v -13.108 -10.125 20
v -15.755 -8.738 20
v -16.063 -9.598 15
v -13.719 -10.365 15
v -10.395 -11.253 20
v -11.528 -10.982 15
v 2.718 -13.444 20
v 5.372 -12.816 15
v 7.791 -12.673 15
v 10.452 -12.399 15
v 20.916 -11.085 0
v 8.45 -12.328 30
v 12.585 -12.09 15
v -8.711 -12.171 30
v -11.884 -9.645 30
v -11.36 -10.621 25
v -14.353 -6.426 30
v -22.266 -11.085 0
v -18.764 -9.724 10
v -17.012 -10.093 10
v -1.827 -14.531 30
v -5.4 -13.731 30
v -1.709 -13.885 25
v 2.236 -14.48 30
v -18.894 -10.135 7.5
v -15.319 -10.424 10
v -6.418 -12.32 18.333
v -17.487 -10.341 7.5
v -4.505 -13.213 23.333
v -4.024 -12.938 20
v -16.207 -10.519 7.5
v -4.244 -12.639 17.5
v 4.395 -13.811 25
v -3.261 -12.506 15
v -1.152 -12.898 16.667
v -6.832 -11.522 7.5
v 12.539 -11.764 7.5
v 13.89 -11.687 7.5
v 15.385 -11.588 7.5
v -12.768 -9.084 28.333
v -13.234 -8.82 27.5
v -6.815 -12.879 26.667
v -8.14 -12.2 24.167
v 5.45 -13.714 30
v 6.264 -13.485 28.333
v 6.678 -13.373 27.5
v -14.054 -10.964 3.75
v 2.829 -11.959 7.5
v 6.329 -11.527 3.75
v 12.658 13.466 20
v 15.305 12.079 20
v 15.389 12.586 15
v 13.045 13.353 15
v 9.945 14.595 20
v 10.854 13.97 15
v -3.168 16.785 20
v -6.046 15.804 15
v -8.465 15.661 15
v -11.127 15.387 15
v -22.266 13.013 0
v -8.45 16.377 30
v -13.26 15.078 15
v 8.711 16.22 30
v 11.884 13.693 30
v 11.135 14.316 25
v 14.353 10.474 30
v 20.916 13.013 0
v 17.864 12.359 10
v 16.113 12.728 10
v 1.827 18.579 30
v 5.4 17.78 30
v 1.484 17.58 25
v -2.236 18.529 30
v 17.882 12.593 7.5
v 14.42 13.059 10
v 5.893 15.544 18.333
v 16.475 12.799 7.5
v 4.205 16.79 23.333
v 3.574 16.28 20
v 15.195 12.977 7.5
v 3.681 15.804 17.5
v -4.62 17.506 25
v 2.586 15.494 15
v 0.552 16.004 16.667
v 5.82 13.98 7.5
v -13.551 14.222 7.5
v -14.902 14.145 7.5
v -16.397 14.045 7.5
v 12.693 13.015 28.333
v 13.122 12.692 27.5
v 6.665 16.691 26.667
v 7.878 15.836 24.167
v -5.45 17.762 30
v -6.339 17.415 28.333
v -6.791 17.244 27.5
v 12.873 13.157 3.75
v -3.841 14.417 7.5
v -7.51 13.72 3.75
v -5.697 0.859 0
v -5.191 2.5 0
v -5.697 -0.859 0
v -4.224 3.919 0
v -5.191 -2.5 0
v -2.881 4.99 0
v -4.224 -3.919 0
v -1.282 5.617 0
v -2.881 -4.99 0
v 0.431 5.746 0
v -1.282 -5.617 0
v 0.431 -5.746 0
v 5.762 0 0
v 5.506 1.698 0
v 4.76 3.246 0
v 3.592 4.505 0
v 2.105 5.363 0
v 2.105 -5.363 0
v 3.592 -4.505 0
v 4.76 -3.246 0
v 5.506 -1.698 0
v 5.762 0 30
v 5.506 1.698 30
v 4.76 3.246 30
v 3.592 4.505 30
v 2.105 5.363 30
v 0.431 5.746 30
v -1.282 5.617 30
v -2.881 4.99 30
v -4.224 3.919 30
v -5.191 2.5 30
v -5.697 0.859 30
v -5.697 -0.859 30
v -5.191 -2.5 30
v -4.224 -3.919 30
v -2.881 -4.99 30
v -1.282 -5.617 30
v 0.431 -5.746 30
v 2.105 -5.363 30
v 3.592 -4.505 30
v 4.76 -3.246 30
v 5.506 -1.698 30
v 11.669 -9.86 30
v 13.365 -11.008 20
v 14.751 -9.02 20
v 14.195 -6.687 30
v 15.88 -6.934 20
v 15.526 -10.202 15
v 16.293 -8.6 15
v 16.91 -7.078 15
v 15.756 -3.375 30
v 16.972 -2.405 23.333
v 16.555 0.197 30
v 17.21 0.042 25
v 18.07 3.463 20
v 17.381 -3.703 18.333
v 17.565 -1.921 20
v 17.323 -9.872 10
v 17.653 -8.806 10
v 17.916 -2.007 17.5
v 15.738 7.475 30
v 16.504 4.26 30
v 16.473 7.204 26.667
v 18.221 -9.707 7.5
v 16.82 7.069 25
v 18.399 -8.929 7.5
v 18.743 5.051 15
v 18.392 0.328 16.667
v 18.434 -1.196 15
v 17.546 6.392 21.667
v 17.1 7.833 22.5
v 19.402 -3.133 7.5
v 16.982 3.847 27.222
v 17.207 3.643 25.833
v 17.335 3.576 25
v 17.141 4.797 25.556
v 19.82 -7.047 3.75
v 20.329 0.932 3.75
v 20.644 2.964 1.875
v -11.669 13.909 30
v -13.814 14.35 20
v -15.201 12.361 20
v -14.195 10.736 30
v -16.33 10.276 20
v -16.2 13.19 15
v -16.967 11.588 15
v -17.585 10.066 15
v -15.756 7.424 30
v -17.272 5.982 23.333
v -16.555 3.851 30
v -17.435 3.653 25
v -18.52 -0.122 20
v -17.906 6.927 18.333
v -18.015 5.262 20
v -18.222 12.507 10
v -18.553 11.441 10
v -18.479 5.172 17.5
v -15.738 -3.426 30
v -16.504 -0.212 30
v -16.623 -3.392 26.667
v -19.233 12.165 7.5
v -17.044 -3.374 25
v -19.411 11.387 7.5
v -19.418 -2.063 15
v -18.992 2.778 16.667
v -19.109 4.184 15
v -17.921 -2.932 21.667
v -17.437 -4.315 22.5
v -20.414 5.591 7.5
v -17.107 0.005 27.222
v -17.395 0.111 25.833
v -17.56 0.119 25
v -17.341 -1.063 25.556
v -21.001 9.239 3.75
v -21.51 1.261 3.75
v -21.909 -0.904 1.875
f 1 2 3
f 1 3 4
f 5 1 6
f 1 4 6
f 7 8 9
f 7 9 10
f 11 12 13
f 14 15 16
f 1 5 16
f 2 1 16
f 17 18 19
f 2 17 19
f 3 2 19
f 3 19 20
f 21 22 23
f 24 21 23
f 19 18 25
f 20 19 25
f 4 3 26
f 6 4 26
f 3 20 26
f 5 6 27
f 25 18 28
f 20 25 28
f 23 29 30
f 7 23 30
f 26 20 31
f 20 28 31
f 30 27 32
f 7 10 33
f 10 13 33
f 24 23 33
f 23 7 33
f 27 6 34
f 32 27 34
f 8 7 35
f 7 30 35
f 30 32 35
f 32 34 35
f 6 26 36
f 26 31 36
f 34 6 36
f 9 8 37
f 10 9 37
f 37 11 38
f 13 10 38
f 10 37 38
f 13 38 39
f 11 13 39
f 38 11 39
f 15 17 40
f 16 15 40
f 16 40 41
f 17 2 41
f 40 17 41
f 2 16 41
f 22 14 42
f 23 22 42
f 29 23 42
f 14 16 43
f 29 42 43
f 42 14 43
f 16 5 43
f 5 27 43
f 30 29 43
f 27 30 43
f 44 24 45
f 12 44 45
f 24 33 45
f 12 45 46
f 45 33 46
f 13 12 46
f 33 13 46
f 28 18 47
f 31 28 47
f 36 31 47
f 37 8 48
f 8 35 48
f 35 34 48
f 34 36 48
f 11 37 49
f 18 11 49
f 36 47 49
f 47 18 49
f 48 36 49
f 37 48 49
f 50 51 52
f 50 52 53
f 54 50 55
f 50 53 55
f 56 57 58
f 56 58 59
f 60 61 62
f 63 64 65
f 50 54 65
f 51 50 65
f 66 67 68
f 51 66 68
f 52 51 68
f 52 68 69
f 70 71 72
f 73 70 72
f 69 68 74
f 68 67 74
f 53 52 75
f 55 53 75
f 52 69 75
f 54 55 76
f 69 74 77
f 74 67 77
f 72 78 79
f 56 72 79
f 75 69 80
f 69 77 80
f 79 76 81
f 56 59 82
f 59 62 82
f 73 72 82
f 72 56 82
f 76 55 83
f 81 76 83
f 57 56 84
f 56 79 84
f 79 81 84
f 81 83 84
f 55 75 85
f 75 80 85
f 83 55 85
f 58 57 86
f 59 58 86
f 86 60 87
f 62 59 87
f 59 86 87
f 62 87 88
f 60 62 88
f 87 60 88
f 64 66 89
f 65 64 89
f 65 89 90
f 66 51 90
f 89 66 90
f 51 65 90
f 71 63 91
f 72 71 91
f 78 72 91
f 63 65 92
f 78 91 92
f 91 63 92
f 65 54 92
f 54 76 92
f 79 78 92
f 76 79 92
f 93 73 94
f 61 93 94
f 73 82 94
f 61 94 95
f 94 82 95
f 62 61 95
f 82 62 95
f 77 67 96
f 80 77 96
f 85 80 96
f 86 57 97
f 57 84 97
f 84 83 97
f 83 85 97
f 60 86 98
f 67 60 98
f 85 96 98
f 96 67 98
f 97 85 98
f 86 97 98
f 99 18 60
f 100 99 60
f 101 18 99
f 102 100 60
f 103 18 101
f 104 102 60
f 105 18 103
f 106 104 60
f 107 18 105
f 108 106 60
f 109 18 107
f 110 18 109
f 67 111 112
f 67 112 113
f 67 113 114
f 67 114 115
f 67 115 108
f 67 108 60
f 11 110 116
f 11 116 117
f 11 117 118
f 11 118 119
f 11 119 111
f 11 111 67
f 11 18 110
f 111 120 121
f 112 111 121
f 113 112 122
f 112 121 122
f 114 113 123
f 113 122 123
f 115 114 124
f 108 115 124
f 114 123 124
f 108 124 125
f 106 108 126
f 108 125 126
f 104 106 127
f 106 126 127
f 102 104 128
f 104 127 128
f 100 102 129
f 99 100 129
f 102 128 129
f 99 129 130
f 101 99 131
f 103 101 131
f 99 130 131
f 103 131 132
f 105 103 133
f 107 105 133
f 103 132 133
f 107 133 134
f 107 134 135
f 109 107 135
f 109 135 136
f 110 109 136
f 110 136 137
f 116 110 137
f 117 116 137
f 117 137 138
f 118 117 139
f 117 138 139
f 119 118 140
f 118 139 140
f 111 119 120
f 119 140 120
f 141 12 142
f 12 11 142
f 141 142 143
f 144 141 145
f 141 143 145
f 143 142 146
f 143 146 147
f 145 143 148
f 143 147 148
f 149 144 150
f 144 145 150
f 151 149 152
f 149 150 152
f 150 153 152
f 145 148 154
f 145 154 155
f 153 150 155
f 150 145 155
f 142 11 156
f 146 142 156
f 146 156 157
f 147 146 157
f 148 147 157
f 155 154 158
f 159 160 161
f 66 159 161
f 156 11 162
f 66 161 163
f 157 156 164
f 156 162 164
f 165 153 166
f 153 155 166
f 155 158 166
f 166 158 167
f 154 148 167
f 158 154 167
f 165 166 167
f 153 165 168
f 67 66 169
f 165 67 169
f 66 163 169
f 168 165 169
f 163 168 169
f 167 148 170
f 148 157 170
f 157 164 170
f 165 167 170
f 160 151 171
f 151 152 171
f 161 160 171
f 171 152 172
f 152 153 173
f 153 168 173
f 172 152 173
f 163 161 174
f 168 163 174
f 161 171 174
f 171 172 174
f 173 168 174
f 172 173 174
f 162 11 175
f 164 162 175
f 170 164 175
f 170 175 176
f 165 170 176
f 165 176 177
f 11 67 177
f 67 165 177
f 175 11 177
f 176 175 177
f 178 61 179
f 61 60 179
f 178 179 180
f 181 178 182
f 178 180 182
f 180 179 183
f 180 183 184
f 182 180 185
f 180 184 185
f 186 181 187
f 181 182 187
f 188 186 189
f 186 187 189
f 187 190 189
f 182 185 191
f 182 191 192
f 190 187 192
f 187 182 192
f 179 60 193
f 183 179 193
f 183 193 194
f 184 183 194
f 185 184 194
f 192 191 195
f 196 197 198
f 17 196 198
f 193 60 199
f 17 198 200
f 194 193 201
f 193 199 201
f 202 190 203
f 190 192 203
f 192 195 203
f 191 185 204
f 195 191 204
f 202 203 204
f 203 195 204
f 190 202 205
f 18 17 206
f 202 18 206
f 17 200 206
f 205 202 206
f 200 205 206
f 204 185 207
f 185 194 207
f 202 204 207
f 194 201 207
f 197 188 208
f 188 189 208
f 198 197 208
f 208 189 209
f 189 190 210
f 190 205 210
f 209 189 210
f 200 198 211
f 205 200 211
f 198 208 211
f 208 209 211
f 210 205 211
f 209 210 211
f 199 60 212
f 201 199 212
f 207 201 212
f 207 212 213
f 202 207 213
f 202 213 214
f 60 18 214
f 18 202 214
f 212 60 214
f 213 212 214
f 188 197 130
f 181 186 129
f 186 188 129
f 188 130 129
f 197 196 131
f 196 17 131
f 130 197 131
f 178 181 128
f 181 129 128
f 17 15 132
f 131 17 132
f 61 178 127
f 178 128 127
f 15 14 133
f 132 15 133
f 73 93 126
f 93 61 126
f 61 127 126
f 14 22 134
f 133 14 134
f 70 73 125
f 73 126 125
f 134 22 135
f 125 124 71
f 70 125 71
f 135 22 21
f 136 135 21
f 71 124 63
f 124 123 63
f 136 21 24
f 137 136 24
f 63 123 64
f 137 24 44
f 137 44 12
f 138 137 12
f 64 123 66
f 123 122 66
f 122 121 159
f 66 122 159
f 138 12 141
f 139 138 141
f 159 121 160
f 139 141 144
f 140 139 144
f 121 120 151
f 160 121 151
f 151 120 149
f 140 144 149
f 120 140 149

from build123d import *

# Parameters (mm, degrees)
F0_W     = 43.1823767722
F0_H     = 24.0973075852
F4_R     = 5.7616257058
F5_DEPTH = 30


# Not quite as in the source:
# - the arcs of a loft's sections are written as splines that run evenly, so that the points pair up as in the source's solid


with BuildPart() as f3:
    # F2 (on offset) → F3 section 0
    with BuildSketch(Plane.XY.offset(30)):
        with BuildLine():
            add(Edge.make_bspline(
                [(-14.3525502898, -6.4258121346), (-13.7994999926, -7.3651843545), (-13.1539455701, -8.2500639934), (-11.7025735307, -9.8769193643), (-10.8967918018, -10.618854869), (-9.1559237309, -11.9313020315), (-8.2208804354, -12.5017812365), (-6.2574169169, -13.4493835823), (-5.2290452443, -13.8264832918), (-3.1184410799, -14.3728249941), (-2.036260777, -14.5420534776), (0.1403746989, -14.6661389313), (1.2347760501, -14.6209928331), (3.3937959567, -14.3180535037), (4.4583611261, -14.0602677631), (6.5167955393, -13.3419454391), (7.5106138842, -12.8814266176), (8.449986104, -12.3283763204)],
                knots=[0, 0, 0, 0, 0.125, 0.125, 0.25, 0.25, 0.375, 0.375, 0.5, 0.5, 0.625, 0.625, 0.75, 0.75, 0.875, 0.875, 1, 1, 1, 1], degree=3))
            add(Edge.make_bspline(
                [(8.449986104, -12.3283763204), (9.3893583239, -11.7753260232), (10.2742379628, -11.1297716007), (11.9010933337, -9.6783995613), (12.6430288384, -8.8726178324), (13.9554760009, -7.1317497615), (14.5259552059, -6.196706466), (15.4735575517, -4.2332429475), (15.8506572612, -3.2048712749), (16.3969989635, -1.0942671105), (16.566227447, -0.0120868075), (16.6903129007, 2.1645486683), (16.6451668025, 3.2589500195), (16.3422274731, 5.4179699262), (16.0844417325, 6.4825350955), (15.3661194086, 8.5409695087), (14.905600587, 9.5347878536), (14.3525502898, 10.4741600735)],
                knots=[0, 0, 0, 0, 0.125, 0.125, 0.25, 0.25, 0.375, 0.375, 0.5, 0.5, 0.625, 0.625, 0.75, 0.75, 0.875, 0.875, 1, 1, 1, 1], degree=3))
            add(Edge.make_bspline(
                [(14.3525502898, 10.4741600735), (13.7994999926, 11.4135322933), (13.1539455701, 12.2984119322), (11.7025735307, 13.9252673031), (10.8967918018, 14.6672028078), (9.1559237309, 15.9796499703), (8.2208804354, 16.5501291753), (6.2574169169, 17.4977315211), (5.2290452443, 17.8748312306), (3.1184410799, 18.4211729329), (2.036260777, 18.5904014164), (-0.1403746989, 18.7144868701), (-1.2347760501, 18.6693407719), (-3.3937959567, 18.3664014425), (-4.4583611261, 18.108615702), (-6.5167955393, 17.390293378), (-7.5106138842, 16.9297745564), (-8.449986104, 16.3767242592)],
                knots=[0, 0, 0, 0, 0.125, 0.125, 0.25, 0.25, 0.375, 0.375, 0.5, 0.5, 0.625, 0.625, 0.75, 0.75, 0.875, 0.875, 1, 1, 1, 1], degree=3))
            add(Edge.make_bspline(
                [(-8.449986104, 16.3767242592), (-9.3893583239, 15.823673962), (-10.2742379628, 15.1781195395), (-11.9010933337, 13.7267475001), (-12.6430288384, 12.9209657712), (-13.9554760009, 11.1800977003), (-14.5259552059, 10.2450544049), (-15.4735575517, 8.2815908863), (-15.8506572612, 7.2532192137), (-16.3969989635, 5.1426150493), (-16.566227447, 4.0604347464), (-16.6903129007, 1.8837992705), (-16.6451668025, 0.7893979193), (-16.3422274731, -1.3696219873), (-16.0844417325, -2.4341871567), (-15.3661194086, -4.4926215699), (-14.905600587, -5.4864399148), (-14.3525502898, -6.4258121346)],
                knots=[0, 0, 0, 0, 0.125, 0.125, 0.25, 0.25, 0.375, 0.375, 0.5, 0.5, 0.625, 0.625, 0.75, 0.75, 0.875, 0.875, 1, 1, 1, 1], degree=3))
        make_face()
    # F0 (on Top) → F3 section 1
    with BuildSketch(Plane.XY):
        with Locations((-0.6747245789, 0.963892322)):
            Rectangle(F0_W, F0_H)
    loft(ruled=True)

    # F4 (on face) → F5 (cut)
    with BuildSketch(Plane.XY.offset(30)):
        Circle(F4_R)
    extrude(amount=-F5_DEPTH, mode=Mode.SUBTRACT)


solid = f3.part
